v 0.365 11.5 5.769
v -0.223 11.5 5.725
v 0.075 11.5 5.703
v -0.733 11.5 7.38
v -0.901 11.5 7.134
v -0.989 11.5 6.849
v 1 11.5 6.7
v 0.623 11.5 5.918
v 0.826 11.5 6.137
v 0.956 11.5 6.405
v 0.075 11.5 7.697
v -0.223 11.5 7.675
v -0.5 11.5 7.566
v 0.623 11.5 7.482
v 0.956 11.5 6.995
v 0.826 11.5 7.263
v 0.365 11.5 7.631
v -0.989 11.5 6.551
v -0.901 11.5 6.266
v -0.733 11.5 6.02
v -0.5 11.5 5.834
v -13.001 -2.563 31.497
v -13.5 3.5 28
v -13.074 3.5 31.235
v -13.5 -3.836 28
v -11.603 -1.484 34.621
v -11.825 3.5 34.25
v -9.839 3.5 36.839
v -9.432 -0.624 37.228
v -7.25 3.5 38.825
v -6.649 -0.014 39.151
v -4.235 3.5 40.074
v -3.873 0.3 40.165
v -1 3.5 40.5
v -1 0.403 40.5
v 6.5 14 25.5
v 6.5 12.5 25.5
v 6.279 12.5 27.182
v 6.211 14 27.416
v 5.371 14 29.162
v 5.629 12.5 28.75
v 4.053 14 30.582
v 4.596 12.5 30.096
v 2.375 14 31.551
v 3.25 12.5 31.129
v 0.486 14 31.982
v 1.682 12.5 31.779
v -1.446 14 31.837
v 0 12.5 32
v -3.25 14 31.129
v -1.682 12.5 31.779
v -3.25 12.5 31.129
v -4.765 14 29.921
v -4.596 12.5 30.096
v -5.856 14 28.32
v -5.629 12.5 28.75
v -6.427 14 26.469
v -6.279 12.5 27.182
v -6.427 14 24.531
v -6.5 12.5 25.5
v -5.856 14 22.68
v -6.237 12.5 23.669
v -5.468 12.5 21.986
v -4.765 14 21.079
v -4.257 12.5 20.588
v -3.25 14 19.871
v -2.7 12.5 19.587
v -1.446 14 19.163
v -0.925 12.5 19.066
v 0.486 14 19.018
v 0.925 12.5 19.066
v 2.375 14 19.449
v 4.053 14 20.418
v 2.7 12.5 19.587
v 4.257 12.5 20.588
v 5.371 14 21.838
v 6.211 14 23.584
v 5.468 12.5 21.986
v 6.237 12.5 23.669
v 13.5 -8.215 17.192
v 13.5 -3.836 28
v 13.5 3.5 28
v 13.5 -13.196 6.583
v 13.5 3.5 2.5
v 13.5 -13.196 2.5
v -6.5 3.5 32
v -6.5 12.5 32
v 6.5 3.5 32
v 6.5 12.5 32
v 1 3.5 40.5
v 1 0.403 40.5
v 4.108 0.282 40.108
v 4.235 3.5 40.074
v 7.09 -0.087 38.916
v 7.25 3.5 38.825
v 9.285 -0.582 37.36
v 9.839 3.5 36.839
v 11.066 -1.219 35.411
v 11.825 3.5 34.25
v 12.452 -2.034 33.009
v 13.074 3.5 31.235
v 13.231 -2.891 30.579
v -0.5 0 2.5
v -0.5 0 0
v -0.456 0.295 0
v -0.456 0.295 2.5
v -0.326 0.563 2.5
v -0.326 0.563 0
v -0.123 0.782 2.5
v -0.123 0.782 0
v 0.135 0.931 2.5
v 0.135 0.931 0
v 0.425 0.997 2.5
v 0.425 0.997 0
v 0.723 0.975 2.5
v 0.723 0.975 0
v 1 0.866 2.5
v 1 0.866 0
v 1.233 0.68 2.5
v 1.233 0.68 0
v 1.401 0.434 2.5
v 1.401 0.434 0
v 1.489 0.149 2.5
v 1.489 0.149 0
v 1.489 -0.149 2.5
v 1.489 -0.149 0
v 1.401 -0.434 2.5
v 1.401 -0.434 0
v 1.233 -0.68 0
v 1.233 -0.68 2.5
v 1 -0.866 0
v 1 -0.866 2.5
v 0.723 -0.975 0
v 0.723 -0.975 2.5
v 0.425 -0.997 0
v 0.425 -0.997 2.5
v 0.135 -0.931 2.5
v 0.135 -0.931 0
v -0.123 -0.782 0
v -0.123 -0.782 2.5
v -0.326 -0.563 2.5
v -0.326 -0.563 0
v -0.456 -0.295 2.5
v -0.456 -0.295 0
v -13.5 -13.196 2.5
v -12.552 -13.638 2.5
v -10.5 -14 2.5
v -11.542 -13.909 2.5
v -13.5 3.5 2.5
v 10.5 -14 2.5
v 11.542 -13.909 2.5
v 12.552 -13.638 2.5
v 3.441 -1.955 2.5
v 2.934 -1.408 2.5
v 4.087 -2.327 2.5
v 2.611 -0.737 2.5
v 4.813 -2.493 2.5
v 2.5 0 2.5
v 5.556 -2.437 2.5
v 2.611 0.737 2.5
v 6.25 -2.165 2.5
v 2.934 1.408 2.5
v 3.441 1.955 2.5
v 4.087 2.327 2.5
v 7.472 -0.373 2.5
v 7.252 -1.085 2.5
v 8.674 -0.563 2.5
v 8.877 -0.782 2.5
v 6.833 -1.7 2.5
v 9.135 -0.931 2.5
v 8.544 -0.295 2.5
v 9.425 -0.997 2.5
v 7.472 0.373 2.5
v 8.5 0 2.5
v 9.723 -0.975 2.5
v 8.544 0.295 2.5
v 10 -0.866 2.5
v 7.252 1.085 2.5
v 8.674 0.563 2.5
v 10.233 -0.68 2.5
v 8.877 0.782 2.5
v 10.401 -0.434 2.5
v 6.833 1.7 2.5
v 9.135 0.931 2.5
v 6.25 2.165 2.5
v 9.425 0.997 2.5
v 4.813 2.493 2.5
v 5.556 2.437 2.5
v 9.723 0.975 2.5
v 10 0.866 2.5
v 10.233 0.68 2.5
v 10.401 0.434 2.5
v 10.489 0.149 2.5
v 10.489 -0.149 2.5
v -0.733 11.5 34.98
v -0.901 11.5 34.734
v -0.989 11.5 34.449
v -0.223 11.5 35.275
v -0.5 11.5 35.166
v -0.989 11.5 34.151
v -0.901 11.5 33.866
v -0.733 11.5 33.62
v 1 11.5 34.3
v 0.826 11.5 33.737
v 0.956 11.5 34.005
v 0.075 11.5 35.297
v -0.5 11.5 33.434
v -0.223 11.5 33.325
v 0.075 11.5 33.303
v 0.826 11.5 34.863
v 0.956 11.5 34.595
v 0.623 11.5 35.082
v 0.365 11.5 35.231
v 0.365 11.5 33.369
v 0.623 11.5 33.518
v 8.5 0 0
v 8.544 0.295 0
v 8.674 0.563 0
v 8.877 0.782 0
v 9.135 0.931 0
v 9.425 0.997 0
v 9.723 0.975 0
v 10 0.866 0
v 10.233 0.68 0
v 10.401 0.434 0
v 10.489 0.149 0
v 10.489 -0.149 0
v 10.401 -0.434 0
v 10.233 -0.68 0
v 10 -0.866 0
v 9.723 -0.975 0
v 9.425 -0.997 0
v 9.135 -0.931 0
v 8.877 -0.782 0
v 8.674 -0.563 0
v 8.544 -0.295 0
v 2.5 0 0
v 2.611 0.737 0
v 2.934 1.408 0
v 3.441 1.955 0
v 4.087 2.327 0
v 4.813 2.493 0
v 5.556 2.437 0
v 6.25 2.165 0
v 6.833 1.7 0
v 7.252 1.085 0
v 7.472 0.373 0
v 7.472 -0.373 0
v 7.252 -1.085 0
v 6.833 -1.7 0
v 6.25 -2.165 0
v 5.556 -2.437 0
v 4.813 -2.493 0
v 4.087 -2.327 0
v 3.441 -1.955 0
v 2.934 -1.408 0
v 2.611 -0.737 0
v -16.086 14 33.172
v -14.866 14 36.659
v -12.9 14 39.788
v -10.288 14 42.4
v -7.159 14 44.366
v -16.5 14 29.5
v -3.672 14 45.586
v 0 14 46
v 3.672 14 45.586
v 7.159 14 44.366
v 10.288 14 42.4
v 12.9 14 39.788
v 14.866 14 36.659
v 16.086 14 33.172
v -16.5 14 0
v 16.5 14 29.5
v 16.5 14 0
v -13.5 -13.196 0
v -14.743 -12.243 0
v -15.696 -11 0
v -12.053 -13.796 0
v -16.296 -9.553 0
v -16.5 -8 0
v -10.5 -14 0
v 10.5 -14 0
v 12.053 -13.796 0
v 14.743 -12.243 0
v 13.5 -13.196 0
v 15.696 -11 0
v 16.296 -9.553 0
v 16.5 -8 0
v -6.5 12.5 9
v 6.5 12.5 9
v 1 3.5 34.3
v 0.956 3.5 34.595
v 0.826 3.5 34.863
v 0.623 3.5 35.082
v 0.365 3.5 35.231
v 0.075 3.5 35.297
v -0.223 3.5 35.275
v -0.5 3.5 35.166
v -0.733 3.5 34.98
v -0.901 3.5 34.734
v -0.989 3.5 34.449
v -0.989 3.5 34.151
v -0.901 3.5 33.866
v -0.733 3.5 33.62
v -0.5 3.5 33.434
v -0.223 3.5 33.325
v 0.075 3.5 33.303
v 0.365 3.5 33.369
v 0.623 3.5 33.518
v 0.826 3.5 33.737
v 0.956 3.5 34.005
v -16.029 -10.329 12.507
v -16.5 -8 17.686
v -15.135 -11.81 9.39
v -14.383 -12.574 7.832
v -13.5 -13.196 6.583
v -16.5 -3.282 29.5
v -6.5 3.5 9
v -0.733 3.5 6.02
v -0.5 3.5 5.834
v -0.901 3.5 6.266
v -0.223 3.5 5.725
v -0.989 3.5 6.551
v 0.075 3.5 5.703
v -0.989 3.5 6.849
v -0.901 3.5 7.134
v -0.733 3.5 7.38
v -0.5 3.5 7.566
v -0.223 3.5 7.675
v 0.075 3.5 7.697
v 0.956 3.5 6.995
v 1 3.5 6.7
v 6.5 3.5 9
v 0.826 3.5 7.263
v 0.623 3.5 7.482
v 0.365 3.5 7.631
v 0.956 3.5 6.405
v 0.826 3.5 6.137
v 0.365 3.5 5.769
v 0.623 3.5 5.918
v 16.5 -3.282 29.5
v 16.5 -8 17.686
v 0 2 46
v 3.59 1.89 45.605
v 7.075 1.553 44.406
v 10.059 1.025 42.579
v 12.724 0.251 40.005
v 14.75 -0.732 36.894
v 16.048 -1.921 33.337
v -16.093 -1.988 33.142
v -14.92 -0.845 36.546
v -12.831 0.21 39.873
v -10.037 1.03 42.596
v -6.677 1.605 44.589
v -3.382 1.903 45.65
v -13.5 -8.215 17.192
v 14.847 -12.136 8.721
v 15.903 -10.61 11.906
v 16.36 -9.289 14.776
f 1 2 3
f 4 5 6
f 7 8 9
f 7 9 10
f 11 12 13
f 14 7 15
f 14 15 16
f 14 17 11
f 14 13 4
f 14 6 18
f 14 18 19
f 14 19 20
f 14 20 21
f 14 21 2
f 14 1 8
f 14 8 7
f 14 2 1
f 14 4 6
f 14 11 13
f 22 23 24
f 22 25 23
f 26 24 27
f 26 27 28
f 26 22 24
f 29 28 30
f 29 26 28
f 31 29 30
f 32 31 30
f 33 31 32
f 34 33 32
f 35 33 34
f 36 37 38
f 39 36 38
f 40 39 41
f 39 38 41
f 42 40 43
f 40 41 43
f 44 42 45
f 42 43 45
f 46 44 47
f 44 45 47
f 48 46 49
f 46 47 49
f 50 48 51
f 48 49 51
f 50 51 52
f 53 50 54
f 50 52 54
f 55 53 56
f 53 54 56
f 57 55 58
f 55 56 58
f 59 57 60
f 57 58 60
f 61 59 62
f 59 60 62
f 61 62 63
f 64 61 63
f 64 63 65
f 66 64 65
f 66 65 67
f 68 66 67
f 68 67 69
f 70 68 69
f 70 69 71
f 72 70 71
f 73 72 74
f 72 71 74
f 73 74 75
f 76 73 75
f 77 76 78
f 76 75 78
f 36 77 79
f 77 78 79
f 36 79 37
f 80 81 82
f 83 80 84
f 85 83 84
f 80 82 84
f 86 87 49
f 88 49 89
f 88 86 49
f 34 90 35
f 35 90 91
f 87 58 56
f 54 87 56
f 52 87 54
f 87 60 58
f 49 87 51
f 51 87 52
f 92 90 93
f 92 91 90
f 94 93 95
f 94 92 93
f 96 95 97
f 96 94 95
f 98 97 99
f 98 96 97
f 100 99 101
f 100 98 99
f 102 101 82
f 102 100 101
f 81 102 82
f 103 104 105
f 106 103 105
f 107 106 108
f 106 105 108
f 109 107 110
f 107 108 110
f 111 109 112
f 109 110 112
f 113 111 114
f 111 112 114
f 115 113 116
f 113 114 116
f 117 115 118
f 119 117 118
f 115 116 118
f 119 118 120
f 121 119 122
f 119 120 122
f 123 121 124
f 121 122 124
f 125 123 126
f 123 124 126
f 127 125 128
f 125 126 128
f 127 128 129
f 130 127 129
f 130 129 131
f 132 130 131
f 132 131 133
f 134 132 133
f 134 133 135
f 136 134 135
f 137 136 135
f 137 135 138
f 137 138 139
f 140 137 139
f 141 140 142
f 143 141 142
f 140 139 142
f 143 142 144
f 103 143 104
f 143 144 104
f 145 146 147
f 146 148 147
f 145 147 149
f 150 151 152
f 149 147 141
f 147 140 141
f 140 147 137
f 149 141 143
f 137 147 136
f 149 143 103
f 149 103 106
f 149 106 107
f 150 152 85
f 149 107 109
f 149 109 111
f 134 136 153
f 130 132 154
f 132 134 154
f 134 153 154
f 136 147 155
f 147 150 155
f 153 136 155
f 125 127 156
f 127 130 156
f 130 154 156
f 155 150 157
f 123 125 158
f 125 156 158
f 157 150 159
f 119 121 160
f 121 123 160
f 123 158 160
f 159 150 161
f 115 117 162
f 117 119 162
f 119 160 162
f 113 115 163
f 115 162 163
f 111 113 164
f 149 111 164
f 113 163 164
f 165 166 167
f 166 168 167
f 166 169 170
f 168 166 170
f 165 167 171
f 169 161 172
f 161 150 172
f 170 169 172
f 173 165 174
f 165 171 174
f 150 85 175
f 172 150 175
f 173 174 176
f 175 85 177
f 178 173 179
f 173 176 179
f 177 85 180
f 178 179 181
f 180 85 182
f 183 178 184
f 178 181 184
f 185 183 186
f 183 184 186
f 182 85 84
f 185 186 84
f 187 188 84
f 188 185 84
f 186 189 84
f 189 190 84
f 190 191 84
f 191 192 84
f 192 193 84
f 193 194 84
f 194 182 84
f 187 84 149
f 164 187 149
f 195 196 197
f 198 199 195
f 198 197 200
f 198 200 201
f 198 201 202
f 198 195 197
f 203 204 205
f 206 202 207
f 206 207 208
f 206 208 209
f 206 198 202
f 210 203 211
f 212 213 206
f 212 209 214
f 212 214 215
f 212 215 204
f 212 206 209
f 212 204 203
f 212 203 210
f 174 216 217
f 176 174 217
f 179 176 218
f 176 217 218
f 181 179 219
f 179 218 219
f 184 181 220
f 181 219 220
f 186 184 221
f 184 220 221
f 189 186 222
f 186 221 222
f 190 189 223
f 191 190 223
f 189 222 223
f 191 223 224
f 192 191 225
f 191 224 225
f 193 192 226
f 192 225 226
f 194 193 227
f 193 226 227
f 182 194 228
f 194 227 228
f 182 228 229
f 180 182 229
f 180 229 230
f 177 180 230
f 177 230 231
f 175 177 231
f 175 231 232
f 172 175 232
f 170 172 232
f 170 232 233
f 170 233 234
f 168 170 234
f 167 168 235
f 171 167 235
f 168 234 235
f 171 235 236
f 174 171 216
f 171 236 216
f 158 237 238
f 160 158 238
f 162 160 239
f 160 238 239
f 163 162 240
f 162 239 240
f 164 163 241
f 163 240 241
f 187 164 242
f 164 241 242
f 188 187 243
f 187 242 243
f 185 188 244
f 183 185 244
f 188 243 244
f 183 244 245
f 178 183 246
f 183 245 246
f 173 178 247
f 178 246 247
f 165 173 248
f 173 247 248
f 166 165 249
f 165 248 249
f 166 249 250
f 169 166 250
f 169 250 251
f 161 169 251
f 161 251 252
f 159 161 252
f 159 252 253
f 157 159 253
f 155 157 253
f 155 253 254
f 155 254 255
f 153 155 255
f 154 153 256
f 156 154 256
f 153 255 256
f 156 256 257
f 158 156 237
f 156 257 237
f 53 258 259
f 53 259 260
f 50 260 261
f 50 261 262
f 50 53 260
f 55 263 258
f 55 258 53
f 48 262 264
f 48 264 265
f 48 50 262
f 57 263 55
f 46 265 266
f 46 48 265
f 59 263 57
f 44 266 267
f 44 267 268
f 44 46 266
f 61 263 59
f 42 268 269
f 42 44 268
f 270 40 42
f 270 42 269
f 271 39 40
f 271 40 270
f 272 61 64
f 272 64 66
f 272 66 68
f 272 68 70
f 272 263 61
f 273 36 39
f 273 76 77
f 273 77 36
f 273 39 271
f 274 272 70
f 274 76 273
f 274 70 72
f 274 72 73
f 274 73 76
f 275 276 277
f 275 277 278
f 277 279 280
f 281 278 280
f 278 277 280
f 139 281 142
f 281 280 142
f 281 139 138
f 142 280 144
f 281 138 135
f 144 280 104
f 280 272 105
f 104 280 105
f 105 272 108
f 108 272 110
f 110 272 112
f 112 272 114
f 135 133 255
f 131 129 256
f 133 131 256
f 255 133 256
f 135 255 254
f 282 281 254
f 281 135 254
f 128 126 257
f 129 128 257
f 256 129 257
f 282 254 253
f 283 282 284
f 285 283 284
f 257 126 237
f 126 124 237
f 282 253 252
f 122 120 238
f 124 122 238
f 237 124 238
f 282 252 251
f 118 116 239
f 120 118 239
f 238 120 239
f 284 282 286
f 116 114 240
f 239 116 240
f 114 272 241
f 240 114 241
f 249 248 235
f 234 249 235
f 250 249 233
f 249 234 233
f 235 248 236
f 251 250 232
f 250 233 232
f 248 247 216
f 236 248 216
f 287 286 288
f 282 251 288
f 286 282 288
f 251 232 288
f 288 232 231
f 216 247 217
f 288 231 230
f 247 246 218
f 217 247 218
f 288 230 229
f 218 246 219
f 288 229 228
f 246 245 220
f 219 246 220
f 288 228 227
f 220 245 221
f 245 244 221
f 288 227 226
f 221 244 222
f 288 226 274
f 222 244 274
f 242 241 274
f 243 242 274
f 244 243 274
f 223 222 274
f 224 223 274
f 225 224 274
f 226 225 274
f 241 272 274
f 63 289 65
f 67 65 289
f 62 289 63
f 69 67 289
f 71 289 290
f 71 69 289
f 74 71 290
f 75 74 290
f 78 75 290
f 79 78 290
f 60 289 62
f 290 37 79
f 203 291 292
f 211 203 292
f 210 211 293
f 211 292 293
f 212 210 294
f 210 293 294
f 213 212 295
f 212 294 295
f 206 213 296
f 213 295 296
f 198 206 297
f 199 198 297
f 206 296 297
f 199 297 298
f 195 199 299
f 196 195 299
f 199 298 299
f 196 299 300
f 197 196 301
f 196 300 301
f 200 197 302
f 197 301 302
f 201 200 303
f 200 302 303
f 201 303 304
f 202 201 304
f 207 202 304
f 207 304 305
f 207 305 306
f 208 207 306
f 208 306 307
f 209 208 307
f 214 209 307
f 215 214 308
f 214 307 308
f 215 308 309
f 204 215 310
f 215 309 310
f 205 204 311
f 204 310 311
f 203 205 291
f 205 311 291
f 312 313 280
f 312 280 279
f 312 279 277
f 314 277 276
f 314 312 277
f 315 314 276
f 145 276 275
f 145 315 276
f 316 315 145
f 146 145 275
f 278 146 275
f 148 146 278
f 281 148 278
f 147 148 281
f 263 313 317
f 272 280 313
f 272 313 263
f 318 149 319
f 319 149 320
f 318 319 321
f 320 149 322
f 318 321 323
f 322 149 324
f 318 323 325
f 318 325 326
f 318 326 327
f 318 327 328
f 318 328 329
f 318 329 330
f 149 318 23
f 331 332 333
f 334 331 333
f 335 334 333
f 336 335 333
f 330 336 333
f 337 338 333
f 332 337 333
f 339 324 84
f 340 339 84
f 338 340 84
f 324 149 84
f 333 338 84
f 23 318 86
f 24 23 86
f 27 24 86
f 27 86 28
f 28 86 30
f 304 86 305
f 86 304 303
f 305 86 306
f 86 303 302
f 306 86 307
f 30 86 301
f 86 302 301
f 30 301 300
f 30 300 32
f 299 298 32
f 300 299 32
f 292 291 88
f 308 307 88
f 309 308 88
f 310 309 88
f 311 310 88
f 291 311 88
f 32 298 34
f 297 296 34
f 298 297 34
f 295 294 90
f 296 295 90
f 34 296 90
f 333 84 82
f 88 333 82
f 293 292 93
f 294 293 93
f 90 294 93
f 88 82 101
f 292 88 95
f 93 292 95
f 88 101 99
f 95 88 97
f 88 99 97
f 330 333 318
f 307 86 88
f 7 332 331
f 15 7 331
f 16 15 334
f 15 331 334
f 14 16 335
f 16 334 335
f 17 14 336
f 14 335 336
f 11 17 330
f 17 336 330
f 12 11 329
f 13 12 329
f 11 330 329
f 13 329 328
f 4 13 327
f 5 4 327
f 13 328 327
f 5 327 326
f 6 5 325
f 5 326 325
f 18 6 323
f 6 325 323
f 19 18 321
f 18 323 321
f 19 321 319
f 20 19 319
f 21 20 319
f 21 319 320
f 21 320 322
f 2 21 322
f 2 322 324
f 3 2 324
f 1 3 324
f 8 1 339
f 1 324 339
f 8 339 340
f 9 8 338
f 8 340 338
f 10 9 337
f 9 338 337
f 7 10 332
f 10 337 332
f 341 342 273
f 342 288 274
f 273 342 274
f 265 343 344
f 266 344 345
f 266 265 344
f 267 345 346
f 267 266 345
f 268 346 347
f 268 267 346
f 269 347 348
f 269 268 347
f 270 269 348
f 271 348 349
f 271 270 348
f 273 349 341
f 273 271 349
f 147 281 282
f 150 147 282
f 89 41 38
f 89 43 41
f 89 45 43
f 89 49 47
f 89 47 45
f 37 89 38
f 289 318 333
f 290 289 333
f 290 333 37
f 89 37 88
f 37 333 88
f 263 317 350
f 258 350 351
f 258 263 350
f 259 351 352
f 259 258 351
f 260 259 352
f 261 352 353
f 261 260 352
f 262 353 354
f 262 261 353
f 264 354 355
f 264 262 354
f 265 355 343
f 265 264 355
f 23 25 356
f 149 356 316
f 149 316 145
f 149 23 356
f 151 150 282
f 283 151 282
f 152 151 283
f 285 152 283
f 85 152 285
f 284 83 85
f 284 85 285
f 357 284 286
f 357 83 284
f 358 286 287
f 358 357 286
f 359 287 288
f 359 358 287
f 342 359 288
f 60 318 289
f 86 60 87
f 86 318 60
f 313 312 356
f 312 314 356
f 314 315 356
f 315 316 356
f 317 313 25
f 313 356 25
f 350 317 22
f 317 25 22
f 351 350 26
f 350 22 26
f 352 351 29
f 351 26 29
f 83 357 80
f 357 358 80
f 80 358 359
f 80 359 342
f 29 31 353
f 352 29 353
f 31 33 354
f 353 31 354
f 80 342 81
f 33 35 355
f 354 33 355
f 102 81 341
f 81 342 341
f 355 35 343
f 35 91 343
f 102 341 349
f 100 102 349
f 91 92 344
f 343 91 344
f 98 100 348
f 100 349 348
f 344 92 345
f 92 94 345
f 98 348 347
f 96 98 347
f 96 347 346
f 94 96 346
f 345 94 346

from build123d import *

# Parameters (mm, degrees)
SKETCH1_W           = 33
SKETCH1_H           = 28
BOSS_EXTRUDE1_DEPTH = 46
CUT_EXTRUDE2_DEPTH  = 59.318093247
CUT_EXTRUDE3_START  = -3
CUT_EXTRUDE3_DEPTH  = 27
FILLET1_R           = 12.5
FILLET2_R           = 16.5
FILLET3_R           = 6
SKETCH4_W           = 13
SKETCH4_H           = 23
CUT_EXTRUDE4_DEPTH  = 9
SKETCH5_R           = 6.5
CUT_EXTRUDE5_DEPTH  = 56.592265809
SKETCH6_R           = 1
CUT_EXTRUDE6_DEPTH  = 8
SKETCH7_R           = 1
SKETCH7_R_2         = 2.5
CUT_EXTRUDE7_DEPTH  = 2.5


with BuildPart() as part:
    # Sketch1 → Boss-Extrude1 (new body)
    with BuildSketch(Plane.XY):
        Rectangle(SKETCH1_W, SKETCH1_H)
    extrude(amount=BOSS_EXTRUDE1_DEPTH)

    # Sketch2 → Cut-Extrude2 (cut, through all)
    with BuildSketch(Plane(origin=(16.5, 0, 0), x_dir=(0, 0, -1), z_dir=(1, 0, 0))):
        with BuildLine():
            Line((-46, 2), (-46, -14))
            Line((-46, -14), (-5, -14))
            add(Edge.make_bspline(
                [(-5, -14), (-24.787424695, -3.854626285), (-46, 2)],
                knots=[0, 0, 0, 1, 1, 1], degree=2))
        make_face()
    extrude(amount=-CUT_EXTRUDE2_DEPTH, mode=Mode.SUBTRACT)

    # Sketch3 → Cut-Extrude3 (cut)
    with BuildSketch(Plane(origin=(16.5, 0, 0), x_dir=(0, 0, -1), z_dir=(1, 0, 0)).offset(CUT_EXTRUDE3_START)):
        with BuildLine():
            Line((-5, -14), (-2.5, -14))
            Line((-2.5, -14), (-2.5, 3.5))
            Line((-2.5, 3.5), (-40.5, 3.5))
            Line((-40.5, 3.5), (-40.5, 0.402594989))
            add(Edge.make_bspline(
                [(-5, -14), (-22.210911626, -5.175651551), (-40.5, 0.402594989)],
                knots=[0, 0, 0, 1, 1, 1], degree=2))
        make_face()
    extrude(amount=-CUT_EXTRUDE3_DEPTH, mode=Mode.SUBTRACT)

    # Fillet1
    fillet1_edges = [part.edges().sort_by_distance(p)[0] for p in [
        (13.5, 1.951297494, 40.5),
        (-13.5, 1.951297494, 40.5),
    ]]
    fillet(fillet1_edges, radius=FILLET1_R)

    # Fillet2
    fillet2_edges = [part.edges().sort_by_distance(p)[0] for p in [
        (16.5, 8, 46),
        (-16.5, 8, 46),
    ]]
    fillet(fillet2_edges, radius=FILLET2_R - 0.0001)  # a hair under: the kernel refuses the full size

    # Fillet3
    fillet3_edges = [part.edges().sort_by_distance(p)[0] for p in [
        (16.5, -14, 2.5),
        (-16.5, -14, 2.5),
    ]]
    fillet(fillet3_edges, radius=FILLET3_R)

    # Sketch4 → Cut-Extrude4 (cut)
    with BuildSketch(Plane.XZ.offset(-3.5)):
        with Locations((0, 20.5)):
            Rectangle(SKETCH4_W, SKETCH4_H)
    extrude(amount=-CUT_EXTRUDE4_DEPTH, mode=Mode.SUBTRACT)

    # Sketch5 → Cut-Extrude5 (cut, through all)
    with BuildSketch(Plane.XZ.offset(-12.5)):
        with Locations((0, 25.5)):
            Circle(SKETCH5_R)
    extrude(amount=-CUT_EXTRUDE5_DEPTH, mode=Mode.SUBTRACT)

    # Sketch6 → Cut-Extrude6 (cut)
    with BuildSketch(Plane.XZ.offset(-3.5)):
        with Locations((0, 34.3)):
            Circle(SKETCH6_R)
        with Locations((0, 6.7)):
            Circle(SKETCH6_R)
    extrude(amount=-CUT_EXTRUDE6_DEPTH, mode=Mode.SUBTRACT)

    # Sketch7 → Cut-Extrude7 (cut)
    with BuildSketch(Plane(origin=(0, 0, 0), x_dir=(-1, 0, 0), z_dir=(0, 0, -1))):
        with Locations((-9.5, 0)):
            Circle(SKETCH7_R)
        with Locations((-5, 0)):
            Circle(SKETCH7_R_2)
        with Locations((-0.5, 0)):
            Circle(SKETCH7_R)
    extrude(amount=-CUT_EXTRUDE7_DEPTH, mode=Mode.SUBTRACT)


solid = part.part
